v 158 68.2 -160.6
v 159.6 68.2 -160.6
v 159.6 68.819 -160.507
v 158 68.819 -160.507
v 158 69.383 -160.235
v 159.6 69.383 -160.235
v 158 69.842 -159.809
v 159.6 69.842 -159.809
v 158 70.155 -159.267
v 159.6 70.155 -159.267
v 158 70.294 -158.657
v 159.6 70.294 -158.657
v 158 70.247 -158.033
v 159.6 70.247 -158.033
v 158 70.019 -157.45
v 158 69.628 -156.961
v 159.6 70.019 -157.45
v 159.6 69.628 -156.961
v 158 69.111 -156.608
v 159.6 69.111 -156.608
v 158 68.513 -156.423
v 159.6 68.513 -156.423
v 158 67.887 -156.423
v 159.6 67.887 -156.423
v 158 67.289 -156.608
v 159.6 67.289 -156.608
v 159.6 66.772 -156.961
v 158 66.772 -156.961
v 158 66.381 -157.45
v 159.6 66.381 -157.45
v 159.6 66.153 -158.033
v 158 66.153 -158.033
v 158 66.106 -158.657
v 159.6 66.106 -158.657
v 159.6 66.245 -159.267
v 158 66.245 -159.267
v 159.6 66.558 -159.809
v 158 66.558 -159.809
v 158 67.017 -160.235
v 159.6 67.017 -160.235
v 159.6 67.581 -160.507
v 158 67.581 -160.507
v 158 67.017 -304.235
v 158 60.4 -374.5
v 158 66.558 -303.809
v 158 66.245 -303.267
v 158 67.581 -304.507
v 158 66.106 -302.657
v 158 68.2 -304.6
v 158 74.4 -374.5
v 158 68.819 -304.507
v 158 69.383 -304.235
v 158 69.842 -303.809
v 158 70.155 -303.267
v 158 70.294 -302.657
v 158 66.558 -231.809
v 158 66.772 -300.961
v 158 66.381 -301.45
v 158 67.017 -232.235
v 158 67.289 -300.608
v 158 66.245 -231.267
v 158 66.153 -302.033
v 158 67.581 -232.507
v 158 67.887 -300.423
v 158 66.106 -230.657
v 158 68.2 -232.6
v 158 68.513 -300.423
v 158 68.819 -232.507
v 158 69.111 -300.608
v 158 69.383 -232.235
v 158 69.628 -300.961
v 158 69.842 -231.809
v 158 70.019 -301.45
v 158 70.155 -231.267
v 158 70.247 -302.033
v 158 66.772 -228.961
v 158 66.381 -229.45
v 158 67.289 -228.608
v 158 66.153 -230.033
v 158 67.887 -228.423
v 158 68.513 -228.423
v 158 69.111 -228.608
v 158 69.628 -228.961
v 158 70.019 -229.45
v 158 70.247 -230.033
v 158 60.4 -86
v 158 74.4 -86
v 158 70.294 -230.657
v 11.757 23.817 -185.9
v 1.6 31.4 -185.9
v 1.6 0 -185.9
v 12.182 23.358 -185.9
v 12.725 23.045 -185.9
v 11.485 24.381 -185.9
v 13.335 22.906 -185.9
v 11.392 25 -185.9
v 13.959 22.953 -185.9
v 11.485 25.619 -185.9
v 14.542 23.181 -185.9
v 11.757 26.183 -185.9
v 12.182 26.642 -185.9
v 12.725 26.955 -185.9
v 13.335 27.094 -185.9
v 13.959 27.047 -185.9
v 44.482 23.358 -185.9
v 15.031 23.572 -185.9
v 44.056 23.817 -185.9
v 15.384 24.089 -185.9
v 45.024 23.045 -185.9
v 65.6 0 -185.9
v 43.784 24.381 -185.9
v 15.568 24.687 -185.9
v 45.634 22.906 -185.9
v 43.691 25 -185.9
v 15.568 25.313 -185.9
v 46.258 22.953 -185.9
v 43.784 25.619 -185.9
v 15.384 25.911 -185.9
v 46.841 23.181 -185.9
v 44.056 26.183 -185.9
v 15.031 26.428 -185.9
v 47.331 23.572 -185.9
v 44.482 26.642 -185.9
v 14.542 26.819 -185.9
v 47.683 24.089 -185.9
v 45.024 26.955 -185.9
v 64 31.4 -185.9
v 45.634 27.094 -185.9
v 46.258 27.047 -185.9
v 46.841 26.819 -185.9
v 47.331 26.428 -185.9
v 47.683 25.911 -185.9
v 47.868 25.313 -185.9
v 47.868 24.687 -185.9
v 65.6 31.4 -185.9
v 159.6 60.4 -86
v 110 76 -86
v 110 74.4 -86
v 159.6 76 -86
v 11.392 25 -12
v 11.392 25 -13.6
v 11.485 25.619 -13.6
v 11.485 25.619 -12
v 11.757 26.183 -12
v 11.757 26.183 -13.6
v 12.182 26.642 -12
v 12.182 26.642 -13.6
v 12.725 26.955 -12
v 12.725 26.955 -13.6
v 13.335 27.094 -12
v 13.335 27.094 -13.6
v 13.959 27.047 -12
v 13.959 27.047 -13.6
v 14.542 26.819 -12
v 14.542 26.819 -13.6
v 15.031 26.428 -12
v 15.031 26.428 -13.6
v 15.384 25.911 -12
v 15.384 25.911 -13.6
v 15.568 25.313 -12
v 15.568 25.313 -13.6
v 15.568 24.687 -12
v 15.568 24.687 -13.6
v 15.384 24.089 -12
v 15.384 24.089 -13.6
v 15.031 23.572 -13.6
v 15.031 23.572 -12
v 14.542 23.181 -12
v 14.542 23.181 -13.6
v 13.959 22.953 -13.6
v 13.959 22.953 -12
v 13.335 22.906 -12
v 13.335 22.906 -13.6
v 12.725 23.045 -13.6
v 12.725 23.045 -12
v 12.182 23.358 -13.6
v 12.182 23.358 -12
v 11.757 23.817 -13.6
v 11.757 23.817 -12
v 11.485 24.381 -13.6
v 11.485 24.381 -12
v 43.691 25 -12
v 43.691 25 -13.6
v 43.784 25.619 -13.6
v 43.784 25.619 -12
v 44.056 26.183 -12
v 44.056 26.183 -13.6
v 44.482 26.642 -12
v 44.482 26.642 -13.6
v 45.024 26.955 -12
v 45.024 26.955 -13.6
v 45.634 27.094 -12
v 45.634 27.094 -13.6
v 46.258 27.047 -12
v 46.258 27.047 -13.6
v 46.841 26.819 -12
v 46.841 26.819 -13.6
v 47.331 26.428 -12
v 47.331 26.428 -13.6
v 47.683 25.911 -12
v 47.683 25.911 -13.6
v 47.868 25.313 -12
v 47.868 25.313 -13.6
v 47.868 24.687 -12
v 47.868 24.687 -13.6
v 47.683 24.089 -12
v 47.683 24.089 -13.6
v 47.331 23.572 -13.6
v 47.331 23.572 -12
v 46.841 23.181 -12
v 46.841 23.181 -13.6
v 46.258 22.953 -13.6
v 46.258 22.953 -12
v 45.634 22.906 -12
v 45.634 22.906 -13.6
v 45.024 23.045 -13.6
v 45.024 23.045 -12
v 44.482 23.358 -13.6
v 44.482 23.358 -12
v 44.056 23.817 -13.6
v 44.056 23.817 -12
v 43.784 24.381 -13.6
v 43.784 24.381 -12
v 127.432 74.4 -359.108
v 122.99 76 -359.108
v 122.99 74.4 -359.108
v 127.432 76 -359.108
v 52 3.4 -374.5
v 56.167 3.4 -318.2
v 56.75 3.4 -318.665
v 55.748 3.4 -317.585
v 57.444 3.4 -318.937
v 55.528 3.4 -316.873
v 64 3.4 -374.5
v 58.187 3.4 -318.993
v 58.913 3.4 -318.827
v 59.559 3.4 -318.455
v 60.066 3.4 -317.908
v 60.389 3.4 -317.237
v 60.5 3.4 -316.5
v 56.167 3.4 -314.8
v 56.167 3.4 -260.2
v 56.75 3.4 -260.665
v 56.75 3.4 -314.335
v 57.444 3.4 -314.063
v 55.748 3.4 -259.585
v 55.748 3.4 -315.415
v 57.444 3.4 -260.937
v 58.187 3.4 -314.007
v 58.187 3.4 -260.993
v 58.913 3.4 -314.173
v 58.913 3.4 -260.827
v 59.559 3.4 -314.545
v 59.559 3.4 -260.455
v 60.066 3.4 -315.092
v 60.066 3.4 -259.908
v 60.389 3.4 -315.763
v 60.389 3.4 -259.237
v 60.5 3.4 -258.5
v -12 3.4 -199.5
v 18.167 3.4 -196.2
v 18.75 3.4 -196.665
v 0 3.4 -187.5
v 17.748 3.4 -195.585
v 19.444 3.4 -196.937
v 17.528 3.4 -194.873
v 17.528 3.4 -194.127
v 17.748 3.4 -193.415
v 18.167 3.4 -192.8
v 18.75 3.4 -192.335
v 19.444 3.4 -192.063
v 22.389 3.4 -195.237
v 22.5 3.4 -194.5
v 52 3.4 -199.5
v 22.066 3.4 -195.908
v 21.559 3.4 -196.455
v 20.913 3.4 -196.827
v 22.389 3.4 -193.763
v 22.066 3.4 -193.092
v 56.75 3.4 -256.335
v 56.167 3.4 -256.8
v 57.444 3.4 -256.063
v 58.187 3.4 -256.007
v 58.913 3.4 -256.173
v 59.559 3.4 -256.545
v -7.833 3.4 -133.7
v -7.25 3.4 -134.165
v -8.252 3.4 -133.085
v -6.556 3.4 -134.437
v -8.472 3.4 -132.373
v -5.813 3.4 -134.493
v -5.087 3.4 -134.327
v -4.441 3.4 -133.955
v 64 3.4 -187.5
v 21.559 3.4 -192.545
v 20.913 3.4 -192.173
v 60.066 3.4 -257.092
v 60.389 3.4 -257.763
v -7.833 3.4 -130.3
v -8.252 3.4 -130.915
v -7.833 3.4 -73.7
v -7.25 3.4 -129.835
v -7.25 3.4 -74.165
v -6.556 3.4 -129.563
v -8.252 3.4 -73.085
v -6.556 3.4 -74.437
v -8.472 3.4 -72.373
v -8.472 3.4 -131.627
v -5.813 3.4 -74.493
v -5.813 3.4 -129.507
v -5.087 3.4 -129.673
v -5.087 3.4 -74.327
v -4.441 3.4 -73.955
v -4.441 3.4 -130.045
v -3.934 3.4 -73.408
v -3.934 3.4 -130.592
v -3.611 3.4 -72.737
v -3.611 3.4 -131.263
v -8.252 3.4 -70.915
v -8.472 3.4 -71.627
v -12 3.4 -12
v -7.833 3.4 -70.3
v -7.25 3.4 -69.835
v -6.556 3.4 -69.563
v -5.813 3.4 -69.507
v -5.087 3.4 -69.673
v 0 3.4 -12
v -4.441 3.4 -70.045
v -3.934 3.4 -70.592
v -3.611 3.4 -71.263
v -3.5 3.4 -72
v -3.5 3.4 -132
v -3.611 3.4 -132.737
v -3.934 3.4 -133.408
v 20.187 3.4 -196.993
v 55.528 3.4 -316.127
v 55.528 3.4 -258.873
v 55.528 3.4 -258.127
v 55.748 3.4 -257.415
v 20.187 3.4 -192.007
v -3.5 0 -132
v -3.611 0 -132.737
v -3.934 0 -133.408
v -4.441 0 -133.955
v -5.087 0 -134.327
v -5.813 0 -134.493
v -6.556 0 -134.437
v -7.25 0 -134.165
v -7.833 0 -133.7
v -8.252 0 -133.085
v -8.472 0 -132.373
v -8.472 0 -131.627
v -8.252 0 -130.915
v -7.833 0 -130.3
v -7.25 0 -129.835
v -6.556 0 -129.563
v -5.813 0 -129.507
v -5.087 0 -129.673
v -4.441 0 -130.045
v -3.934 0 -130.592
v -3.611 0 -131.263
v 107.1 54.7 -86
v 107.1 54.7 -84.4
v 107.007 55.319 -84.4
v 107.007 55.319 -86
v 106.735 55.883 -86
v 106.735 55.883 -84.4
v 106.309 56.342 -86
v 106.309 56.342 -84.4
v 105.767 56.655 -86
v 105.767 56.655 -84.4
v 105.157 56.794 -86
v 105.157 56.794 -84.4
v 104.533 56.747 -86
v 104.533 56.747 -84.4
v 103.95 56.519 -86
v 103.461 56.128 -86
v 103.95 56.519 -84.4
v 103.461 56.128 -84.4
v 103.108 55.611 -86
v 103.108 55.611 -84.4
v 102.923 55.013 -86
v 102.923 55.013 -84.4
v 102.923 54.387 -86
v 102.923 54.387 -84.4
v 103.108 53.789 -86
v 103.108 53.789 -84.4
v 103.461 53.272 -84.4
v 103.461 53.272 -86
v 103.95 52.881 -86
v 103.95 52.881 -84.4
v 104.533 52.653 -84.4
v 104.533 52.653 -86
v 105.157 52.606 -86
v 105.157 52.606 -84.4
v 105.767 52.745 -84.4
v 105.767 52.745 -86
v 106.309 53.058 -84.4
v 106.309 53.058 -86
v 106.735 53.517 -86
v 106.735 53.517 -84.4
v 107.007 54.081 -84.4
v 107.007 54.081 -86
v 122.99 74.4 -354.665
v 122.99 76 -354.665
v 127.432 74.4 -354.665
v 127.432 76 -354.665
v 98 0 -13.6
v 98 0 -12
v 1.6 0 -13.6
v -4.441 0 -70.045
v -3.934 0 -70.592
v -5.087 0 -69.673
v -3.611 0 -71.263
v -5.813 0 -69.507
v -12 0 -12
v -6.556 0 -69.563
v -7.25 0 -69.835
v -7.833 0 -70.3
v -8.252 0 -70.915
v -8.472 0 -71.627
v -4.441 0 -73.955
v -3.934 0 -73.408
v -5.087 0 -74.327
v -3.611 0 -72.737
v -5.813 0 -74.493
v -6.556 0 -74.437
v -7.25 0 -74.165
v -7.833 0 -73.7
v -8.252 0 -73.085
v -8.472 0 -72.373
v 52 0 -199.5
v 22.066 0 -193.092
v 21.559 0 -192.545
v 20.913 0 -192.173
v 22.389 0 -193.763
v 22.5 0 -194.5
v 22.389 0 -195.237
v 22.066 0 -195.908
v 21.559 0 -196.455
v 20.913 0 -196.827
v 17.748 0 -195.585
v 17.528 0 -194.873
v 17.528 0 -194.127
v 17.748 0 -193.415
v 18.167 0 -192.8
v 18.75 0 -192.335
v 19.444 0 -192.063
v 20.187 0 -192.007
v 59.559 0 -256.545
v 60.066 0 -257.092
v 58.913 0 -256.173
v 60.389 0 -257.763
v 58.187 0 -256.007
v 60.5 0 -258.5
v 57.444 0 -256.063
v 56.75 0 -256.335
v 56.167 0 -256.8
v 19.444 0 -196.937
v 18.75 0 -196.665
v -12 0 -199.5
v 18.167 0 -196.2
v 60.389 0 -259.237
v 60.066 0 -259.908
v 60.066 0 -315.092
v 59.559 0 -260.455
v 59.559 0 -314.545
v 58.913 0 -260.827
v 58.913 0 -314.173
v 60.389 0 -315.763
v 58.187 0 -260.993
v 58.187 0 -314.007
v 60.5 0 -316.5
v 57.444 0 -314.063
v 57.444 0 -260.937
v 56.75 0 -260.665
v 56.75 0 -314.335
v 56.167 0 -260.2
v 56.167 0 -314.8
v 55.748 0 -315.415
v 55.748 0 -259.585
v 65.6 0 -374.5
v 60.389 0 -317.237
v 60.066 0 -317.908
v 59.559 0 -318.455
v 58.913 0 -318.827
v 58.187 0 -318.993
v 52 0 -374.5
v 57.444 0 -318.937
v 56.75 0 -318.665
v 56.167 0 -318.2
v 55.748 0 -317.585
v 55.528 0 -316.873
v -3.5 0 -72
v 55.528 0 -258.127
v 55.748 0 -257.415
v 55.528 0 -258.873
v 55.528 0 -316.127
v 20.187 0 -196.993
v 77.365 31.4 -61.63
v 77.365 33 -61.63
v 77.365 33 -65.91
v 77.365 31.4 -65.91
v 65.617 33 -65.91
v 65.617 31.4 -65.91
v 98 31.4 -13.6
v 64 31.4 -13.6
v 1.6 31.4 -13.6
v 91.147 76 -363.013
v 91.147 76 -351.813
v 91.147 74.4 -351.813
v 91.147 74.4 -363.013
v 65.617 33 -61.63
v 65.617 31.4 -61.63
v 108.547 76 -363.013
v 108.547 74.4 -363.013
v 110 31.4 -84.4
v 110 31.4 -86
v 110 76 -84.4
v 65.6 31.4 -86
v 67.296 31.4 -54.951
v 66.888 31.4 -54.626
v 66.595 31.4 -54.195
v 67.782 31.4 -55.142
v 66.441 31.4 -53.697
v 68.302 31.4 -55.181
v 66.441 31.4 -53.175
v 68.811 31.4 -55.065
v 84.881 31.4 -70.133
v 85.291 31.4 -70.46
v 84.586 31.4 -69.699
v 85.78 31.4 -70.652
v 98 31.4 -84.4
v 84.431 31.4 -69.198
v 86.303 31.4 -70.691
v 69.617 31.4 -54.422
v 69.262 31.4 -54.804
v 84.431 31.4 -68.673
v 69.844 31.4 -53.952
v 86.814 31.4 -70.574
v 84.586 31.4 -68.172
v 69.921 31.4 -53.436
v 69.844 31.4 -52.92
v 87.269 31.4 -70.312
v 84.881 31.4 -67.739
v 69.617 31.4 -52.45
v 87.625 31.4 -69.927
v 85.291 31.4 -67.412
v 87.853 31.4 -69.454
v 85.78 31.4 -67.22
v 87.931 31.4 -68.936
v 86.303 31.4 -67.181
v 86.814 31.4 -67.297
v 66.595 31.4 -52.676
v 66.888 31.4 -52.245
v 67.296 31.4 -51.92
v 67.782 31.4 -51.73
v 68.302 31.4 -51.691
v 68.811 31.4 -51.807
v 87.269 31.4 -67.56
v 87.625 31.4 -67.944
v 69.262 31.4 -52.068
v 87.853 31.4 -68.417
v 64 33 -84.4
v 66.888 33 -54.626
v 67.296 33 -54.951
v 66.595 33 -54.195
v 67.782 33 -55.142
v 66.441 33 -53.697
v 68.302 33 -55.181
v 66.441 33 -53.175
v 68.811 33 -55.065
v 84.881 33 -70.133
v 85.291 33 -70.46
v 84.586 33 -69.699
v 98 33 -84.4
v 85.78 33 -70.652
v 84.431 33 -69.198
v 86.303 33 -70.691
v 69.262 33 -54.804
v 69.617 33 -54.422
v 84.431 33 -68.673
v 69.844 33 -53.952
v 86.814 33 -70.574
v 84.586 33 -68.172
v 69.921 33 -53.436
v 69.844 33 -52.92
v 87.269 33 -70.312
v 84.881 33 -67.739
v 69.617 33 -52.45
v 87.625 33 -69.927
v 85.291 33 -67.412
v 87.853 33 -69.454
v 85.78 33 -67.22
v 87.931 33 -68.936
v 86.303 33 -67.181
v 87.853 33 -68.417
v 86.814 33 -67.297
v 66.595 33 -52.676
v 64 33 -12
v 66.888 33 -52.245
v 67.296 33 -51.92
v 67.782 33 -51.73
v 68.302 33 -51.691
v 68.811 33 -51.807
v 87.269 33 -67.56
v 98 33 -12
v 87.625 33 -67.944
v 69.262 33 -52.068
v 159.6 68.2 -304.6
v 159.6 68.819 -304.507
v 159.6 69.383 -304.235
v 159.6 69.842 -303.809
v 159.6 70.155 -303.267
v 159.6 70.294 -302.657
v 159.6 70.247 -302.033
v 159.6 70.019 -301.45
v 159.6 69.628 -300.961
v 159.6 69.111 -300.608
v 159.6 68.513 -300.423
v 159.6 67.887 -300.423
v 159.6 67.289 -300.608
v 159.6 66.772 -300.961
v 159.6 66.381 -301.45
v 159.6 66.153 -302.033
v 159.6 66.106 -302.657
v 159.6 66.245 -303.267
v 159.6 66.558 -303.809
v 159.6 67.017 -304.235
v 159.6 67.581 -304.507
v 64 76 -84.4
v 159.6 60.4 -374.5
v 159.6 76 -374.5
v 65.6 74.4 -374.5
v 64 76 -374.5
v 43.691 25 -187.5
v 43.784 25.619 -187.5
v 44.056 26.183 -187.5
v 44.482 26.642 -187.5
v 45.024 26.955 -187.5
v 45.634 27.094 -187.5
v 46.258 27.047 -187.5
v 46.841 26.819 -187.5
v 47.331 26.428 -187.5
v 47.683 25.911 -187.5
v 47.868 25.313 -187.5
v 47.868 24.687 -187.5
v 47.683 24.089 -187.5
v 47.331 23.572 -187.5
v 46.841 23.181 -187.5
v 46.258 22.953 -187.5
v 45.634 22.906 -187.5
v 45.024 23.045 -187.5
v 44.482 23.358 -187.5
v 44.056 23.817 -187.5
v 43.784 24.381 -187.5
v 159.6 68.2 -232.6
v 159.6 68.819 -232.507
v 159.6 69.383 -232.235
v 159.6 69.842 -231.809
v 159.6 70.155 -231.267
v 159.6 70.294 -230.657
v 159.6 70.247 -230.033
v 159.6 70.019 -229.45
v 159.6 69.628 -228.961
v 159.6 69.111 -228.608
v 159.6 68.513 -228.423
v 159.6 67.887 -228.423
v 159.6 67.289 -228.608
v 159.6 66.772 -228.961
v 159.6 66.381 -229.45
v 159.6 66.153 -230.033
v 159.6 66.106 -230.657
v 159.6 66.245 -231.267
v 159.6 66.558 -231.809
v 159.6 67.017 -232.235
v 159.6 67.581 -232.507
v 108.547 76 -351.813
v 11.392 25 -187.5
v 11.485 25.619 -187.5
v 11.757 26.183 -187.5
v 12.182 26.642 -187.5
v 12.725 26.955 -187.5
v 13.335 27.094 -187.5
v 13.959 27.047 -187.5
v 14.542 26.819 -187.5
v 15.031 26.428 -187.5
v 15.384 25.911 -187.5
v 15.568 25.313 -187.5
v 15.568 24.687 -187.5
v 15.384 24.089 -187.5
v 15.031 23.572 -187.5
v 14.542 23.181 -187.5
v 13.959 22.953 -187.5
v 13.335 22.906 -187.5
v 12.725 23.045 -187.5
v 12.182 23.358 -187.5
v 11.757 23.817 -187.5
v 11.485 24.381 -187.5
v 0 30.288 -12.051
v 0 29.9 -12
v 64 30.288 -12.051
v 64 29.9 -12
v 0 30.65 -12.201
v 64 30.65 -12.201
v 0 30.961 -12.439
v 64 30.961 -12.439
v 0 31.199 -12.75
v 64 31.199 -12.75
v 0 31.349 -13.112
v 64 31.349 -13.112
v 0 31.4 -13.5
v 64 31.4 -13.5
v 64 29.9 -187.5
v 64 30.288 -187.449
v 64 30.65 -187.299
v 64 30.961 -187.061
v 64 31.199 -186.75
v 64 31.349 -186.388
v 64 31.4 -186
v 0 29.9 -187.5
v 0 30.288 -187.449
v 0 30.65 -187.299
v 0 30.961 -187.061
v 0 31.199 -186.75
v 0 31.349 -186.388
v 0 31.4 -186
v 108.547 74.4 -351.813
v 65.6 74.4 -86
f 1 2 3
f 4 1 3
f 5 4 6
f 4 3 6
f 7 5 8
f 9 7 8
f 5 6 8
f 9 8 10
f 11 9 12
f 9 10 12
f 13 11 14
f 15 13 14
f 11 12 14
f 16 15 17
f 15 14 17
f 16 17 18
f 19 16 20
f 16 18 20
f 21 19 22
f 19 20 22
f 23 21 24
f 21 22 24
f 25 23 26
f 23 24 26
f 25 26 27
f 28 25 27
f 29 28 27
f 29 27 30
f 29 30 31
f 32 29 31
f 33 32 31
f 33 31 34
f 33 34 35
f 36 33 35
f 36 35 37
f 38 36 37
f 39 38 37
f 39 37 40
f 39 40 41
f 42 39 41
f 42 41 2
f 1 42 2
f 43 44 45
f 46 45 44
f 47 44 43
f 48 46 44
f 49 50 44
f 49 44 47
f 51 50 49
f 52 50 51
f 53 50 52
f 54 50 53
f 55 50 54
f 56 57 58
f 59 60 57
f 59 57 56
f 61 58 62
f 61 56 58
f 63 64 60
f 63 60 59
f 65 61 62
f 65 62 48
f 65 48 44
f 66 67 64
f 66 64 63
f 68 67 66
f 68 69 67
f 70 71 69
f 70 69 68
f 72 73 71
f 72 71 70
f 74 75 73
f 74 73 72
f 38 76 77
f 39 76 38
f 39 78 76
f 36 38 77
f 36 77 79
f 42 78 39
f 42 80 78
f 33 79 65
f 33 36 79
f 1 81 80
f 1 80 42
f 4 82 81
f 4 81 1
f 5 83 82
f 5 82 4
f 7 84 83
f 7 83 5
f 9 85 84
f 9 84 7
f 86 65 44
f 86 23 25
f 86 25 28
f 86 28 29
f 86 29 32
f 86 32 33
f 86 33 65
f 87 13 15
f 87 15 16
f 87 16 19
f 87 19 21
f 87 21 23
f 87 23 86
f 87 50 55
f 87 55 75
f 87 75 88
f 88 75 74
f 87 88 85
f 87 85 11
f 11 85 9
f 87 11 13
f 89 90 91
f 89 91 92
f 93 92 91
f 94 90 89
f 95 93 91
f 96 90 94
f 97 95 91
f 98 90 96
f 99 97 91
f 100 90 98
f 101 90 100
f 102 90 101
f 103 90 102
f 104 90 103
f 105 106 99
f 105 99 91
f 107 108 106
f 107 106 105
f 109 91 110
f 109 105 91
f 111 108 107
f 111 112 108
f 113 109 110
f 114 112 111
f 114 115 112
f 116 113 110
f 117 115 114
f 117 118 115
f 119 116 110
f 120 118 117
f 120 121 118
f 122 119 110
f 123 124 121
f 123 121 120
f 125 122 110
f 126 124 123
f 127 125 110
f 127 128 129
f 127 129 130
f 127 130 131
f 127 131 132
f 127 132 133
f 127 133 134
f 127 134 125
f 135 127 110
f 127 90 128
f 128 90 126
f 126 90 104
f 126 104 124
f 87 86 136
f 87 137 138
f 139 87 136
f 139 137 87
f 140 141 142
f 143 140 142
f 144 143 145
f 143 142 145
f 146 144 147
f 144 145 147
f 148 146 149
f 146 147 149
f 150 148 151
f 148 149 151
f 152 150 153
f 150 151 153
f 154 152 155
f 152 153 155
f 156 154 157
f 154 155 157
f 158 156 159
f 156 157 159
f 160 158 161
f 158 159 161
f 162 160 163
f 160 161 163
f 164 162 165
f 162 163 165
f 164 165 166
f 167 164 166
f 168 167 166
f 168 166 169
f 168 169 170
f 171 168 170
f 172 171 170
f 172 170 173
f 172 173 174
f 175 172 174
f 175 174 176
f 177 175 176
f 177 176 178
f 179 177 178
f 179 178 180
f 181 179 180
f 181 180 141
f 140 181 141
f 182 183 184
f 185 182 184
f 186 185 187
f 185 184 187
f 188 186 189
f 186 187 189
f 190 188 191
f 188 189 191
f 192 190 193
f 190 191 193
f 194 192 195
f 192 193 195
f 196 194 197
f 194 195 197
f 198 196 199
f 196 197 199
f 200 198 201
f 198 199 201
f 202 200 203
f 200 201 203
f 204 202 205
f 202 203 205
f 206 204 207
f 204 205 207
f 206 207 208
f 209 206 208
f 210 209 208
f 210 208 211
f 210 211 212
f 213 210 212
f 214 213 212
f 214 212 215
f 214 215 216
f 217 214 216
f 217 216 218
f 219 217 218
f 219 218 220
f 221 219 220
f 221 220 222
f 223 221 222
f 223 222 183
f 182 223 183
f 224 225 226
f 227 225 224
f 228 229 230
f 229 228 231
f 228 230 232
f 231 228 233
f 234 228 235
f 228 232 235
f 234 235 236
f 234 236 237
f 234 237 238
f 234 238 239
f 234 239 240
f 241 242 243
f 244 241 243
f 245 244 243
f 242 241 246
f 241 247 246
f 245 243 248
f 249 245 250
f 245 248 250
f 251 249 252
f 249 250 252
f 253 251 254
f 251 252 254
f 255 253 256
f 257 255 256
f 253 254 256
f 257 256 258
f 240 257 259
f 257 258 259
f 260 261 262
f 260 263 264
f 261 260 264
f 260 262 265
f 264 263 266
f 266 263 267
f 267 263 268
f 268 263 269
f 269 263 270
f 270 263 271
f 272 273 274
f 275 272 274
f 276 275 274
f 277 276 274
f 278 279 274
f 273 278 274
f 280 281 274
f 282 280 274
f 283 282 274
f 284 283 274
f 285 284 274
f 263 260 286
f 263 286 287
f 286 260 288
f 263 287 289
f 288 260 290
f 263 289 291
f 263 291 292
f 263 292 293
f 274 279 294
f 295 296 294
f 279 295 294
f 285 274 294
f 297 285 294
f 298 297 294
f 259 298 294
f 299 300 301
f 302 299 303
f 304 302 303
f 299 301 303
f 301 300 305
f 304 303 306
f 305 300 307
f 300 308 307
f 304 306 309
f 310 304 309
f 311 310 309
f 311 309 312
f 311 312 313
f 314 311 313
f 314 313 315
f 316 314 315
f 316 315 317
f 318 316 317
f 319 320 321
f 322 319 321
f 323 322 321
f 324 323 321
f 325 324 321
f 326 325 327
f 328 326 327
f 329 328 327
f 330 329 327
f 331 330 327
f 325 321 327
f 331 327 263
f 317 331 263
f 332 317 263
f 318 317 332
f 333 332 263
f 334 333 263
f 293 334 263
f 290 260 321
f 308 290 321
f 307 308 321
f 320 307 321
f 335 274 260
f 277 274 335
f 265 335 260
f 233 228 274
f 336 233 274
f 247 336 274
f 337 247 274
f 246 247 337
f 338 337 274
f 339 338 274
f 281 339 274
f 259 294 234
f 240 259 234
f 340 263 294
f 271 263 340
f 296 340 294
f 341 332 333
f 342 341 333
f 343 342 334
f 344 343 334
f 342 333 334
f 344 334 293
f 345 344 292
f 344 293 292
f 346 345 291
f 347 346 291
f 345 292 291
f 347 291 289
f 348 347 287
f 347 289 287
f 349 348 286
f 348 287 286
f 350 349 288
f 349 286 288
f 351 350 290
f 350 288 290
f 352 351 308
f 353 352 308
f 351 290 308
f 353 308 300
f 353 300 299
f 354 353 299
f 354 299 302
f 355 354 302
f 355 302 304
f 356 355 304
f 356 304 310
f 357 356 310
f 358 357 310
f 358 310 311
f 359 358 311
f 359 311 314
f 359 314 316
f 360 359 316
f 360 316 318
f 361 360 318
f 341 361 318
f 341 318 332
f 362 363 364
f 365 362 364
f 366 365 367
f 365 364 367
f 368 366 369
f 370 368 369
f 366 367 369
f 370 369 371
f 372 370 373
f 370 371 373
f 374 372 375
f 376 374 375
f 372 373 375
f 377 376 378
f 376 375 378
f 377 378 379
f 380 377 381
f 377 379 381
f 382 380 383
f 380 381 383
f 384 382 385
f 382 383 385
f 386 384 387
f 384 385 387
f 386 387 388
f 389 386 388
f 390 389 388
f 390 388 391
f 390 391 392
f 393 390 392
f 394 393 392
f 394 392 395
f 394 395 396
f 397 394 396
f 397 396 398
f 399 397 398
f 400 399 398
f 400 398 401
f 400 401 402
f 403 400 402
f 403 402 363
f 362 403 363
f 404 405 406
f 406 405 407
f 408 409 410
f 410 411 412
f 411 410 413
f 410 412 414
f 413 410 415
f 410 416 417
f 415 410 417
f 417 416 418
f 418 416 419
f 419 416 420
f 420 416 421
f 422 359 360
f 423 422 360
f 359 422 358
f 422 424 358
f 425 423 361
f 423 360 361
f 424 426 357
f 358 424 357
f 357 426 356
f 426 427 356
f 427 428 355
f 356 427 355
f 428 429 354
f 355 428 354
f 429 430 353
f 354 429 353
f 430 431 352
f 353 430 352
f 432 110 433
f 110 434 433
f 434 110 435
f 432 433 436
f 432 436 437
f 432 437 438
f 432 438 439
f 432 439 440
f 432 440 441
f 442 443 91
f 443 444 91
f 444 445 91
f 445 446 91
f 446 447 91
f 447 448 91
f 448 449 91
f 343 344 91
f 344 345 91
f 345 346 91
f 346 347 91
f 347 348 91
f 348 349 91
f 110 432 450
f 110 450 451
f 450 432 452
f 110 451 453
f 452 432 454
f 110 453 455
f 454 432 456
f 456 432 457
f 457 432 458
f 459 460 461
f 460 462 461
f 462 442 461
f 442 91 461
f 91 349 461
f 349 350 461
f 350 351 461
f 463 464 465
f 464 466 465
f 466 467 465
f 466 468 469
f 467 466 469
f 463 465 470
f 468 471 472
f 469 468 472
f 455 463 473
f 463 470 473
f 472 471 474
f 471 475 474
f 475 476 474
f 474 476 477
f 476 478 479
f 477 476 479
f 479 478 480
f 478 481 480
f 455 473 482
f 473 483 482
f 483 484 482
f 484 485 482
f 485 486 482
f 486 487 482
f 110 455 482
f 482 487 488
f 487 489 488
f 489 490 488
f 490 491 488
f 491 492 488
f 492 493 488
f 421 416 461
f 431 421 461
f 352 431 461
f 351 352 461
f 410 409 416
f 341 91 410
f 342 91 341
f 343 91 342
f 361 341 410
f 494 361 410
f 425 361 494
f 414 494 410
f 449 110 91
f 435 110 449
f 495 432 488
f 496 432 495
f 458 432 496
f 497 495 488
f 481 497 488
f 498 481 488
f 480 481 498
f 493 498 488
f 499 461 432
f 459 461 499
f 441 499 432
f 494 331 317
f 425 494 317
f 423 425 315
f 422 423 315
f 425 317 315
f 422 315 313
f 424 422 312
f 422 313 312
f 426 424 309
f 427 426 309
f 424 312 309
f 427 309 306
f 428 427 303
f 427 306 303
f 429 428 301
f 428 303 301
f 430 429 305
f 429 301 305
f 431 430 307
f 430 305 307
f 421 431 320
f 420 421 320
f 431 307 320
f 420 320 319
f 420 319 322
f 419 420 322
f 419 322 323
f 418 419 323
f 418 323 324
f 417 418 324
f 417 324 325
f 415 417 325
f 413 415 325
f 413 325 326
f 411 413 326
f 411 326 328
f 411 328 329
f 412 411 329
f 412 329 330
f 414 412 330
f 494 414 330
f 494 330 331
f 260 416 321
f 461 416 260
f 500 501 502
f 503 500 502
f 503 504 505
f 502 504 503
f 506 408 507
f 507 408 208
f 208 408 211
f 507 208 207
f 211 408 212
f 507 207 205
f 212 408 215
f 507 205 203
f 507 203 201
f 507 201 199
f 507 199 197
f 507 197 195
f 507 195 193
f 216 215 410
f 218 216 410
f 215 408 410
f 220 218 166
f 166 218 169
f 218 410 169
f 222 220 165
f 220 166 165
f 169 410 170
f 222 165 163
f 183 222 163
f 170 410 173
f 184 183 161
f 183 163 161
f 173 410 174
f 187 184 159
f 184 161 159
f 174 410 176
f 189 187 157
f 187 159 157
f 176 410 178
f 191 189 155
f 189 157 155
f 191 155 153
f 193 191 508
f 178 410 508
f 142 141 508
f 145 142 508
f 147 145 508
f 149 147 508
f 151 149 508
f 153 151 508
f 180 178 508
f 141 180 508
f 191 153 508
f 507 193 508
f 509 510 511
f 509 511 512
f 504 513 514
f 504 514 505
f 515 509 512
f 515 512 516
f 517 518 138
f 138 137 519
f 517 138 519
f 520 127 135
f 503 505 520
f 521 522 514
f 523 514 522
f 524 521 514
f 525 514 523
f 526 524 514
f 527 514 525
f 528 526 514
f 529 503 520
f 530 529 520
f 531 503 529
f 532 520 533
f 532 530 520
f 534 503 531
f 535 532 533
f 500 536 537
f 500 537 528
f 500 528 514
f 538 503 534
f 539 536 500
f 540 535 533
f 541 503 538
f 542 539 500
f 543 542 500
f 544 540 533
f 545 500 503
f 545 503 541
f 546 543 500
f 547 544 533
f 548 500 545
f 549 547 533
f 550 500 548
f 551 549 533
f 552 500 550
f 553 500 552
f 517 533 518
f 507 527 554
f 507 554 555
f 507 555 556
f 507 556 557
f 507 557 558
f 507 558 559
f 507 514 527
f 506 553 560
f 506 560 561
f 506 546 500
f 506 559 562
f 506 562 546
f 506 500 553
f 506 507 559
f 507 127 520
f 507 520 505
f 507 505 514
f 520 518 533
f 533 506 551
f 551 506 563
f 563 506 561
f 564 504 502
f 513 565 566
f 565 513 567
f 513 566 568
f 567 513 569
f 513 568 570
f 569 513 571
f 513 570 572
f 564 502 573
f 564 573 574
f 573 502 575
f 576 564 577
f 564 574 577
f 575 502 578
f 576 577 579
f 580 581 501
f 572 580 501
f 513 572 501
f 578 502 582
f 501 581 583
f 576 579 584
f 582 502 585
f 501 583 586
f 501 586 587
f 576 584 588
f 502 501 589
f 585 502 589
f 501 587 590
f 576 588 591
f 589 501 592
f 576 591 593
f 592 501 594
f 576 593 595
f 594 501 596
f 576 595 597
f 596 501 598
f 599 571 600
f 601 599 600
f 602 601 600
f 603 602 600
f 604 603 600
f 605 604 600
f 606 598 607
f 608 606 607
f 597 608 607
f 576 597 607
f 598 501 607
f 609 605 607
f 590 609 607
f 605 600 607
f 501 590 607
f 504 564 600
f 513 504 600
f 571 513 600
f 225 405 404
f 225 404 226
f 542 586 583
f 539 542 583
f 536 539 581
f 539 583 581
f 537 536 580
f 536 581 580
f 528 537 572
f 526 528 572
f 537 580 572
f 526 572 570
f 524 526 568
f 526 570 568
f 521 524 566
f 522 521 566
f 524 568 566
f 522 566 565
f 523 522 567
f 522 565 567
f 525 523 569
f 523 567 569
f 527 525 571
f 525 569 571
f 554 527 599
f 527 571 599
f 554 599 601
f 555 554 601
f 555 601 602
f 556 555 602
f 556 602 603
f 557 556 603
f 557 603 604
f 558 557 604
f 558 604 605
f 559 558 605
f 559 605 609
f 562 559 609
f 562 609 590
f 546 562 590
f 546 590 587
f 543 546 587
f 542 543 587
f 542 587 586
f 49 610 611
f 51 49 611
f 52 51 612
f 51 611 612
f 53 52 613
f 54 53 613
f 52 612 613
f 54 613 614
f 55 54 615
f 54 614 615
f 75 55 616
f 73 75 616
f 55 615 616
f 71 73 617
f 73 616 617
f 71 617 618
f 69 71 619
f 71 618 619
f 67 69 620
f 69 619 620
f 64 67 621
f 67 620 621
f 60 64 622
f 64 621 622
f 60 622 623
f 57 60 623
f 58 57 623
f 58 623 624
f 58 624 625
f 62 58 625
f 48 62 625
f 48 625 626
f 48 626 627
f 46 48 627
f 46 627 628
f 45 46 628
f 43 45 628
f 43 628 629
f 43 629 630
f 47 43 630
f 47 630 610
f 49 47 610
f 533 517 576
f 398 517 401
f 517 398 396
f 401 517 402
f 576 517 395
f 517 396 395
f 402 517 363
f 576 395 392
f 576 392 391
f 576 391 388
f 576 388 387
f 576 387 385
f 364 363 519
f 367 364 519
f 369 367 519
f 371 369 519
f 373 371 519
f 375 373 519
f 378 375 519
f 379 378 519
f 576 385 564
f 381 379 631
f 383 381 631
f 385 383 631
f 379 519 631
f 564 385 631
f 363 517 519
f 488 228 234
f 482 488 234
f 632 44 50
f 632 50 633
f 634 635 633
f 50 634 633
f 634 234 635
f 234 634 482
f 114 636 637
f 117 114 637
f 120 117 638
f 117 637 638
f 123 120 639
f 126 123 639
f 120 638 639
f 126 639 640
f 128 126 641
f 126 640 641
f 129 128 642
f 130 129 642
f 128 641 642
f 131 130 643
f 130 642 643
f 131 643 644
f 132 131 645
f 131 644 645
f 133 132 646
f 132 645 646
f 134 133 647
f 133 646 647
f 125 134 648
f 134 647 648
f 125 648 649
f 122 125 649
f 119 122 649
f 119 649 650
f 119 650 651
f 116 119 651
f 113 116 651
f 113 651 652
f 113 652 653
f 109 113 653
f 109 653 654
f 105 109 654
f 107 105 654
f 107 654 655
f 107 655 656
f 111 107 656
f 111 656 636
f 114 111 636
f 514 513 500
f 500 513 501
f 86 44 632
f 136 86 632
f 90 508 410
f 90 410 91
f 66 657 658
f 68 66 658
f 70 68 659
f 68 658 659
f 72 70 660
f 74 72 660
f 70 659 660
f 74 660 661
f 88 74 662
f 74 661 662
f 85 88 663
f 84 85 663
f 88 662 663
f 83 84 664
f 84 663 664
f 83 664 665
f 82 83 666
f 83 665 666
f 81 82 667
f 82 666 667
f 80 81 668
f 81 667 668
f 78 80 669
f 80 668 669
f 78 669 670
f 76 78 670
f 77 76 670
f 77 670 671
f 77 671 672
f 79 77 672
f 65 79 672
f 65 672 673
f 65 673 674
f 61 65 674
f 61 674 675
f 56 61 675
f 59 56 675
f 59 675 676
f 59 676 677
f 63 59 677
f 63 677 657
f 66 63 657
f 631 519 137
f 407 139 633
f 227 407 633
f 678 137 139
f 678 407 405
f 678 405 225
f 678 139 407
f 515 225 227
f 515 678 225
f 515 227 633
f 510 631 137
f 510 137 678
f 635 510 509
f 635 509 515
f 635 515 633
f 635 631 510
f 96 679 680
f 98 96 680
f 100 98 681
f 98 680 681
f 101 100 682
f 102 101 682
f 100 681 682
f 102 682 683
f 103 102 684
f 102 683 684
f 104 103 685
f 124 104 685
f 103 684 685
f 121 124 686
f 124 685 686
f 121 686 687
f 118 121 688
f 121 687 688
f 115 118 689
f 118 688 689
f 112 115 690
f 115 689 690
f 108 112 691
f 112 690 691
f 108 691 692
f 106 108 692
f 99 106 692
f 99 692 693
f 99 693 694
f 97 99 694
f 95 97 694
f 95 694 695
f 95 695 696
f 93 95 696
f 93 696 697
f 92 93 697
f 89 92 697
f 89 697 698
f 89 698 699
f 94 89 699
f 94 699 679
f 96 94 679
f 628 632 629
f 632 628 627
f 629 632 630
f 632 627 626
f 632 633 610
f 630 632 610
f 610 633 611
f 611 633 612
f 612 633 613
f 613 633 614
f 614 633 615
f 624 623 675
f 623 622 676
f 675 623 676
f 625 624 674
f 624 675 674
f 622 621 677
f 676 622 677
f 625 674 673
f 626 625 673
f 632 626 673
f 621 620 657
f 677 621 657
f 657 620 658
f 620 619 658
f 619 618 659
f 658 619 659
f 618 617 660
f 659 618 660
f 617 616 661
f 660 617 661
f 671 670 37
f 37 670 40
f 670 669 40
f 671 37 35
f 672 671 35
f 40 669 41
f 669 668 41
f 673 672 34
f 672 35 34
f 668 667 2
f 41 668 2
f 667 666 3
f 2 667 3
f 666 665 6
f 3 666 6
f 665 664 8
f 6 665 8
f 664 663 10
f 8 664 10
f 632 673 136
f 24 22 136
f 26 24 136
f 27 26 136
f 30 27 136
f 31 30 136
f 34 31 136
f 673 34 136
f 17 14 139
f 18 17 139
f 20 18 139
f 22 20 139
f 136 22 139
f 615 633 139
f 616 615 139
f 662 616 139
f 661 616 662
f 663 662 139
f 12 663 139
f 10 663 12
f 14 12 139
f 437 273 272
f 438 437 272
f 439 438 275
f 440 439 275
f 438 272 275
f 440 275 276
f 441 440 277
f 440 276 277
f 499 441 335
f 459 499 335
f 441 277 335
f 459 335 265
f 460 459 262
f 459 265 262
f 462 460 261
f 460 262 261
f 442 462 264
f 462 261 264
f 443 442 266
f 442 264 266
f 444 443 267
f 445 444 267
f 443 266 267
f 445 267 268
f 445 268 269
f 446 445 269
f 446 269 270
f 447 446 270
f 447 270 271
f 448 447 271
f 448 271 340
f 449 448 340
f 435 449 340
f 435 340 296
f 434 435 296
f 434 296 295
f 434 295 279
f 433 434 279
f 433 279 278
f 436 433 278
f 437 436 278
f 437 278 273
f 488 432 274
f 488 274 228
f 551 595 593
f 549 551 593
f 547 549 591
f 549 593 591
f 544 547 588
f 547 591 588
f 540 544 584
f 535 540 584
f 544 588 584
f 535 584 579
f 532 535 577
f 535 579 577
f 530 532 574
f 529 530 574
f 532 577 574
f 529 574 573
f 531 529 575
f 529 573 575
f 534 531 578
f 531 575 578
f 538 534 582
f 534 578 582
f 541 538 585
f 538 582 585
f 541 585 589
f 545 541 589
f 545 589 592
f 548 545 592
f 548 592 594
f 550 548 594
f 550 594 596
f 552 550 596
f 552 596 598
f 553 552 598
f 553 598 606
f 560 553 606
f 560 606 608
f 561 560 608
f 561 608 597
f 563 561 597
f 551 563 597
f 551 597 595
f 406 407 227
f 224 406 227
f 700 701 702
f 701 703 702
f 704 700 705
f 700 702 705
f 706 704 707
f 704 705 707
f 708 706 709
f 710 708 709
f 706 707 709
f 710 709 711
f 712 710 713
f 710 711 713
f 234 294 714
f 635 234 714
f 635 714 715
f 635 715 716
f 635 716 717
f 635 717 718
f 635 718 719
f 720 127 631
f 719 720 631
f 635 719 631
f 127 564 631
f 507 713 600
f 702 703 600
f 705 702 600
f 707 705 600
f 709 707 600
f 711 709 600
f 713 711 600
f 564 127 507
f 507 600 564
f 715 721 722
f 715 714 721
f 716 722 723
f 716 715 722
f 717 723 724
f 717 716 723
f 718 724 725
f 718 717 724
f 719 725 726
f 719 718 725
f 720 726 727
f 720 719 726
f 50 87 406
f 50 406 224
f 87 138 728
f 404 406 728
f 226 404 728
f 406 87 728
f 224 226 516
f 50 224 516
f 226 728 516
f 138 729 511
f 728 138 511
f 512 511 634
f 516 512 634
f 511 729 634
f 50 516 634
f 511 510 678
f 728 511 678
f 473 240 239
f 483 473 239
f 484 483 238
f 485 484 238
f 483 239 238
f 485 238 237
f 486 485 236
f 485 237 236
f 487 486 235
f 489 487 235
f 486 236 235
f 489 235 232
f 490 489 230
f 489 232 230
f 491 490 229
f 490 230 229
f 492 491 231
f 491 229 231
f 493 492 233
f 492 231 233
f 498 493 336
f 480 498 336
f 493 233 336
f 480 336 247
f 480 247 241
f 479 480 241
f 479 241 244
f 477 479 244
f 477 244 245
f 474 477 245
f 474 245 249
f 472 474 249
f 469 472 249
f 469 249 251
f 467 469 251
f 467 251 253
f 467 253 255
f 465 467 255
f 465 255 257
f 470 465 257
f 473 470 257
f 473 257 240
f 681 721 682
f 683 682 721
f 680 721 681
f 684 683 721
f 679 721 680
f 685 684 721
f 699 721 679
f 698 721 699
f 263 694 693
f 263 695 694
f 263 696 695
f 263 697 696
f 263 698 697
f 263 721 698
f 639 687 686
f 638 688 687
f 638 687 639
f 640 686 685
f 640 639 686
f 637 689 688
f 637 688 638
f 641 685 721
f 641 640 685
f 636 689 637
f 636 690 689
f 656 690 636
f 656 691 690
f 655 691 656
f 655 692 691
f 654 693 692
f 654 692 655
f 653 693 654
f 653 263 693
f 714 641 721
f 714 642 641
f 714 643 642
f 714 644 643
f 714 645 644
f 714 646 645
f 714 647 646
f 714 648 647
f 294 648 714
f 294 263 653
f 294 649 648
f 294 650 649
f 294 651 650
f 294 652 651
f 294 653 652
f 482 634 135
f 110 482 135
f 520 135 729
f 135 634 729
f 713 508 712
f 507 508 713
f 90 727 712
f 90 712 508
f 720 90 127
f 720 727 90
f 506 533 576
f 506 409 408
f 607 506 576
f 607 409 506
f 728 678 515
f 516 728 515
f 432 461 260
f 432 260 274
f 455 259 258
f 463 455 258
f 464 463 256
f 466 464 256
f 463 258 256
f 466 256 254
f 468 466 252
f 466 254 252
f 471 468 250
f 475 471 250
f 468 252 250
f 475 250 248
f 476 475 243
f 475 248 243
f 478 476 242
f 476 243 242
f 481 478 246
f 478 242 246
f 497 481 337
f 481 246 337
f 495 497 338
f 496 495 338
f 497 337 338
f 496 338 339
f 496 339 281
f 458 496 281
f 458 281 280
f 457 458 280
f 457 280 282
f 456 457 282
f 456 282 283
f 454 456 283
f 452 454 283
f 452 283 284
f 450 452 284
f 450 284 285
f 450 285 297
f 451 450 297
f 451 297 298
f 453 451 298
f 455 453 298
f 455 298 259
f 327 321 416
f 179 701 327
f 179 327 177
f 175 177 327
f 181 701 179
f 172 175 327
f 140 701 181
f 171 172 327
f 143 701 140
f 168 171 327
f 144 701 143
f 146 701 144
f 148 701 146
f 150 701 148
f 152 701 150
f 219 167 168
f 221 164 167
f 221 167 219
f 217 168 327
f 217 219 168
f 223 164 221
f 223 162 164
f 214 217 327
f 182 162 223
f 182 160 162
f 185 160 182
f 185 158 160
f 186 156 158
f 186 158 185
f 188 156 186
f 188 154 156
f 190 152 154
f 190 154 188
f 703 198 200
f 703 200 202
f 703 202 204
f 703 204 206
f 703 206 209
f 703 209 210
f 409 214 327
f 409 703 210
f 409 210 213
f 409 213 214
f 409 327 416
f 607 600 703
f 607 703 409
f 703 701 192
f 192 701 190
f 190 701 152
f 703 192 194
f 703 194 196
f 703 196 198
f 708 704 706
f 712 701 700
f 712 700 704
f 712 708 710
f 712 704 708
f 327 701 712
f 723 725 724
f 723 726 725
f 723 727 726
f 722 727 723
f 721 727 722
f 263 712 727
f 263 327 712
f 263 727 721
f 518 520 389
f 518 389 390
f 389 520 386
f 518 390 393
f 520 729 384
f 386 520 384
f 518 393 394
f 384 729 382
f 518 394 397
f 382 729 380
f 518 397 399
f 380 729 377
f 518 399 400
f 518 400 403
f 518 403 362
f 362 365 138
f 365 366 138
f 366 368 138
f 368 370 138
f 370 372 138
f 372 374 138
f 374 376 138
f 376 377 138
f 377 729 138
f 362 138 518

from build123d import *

# Parameters (mm, degrees)
BOSS_EXTRUDE1_DEPTH  = 76
SKETCH2_W            = 187.5
SKETCH2_H            = 42.6
CUT_EXTRUDE1_DEPTH   = 64
BOSS_EXTRUDE2_DEPTH  = 3.4
CUT_EXTRUDE2_DEPTH   = 12
SKETCH5_W            = 1.6
SKETCH5_H            = 42.6
BOSS_EXTRUDE3_DEPTH  = 141.4
SKETCH6_W            = 1.6
SKETCH6_H            = 33.4
BOSS_EXTRUDE4_DEPTH  = 158
SKETCH7_W            = 74
SKETCH7_H            = 1.6
BOSS_EXTRUDE5_DEPTH  = 94
SKETCH8_W            = 1.6
SKETCH8_H            = 41
CUT_EXTRUDE3_DEPTH   = 74
SKETCH10_W           = 95.6
SKETCH10_H           = 41
BOSS_EXTRUDE8_DEPTH  = 1.6
SKETCH11_W           = 62.4
SKETCH11_H           = 32.5
CUT_EXTRUDE4_DEPTH   = 33.4
SKETCH12_W           = 1.6
SKETCH12_H           = 32.5
CUT_EXTRUDE5_DEPTH   = 33.4
SKETCH13_W           = 61.6
SKETCH13_H           = 76
CUT_EXTRUDE6_DEPTH   = 74
SKETCH16_W           = 1.6
SKETCH16_H           = 42.6
BOSS_EXTRUDE11_DEPTH = 12
SKETCH17_W           = 288.5
SKETCH17_H           = 1.6
BOSS_EXTRUDE12_DEPTH = 94
SKETCH18_W           = 1.6
SKETCH18_H           = 288.5
BOSS_EXTRUDE13_DEPTH = 14
SKETCH19_R           = 1.75
SKETCH19_R_2         = 1.76
CUT_EXTRUDE7_DEPTH   = 5
SKETCH20_R           = 2.1
CUT_EXTRUDE9_DEPTH   = 195
SKETCH21_R           = 2.5
CUT_EXTRUDE10_DEPTH  = 10
SKETCH22_R           = 2.1
CUT_EXTRUDE11_DEPTH  = 4
SKETCH23_R           = 2.1
CUT_EXTRUDE12_DEPTH  = 4
SKETCH25_W           = 17.4
SKETCH25_H           = 11.2
SKETCH25_W_2         = 4.442640687
SKETCH25_H_2         = 4.442640687
CUT_EXTRUDE13_DEPTH  = 4
SKETCH27_W           = 64
SKETCH27_H           = 175.5
CUT_EXTRUDE15_DEPTH  = 2
CUT_EXTRUDE16_DEPTH  = 52
BOSS_EXTRUDE14_DEPTH = 2
SKETCH33_W           = 34
SKETCH33_H           = 1.6
BOSS_EXTRUDE16_DEPTH = 72.4
FILLET1_R            = 1.5
SKETCH34_R           = 1.76
SKETCH34_R_2         = 1.75
CUT_EXTRUDE17_DEPTH  = 10
SKETCH35_W           = 11.747931796
SKETCH35_H           = 4.280254221
CUT_EXTRUDE18_DEPTH  = 10


with BuildPart() as part:
    # Sketch1 → Boss-Extrude1 (new body)
    with BuildSketch(Plane(origin=(0, 0, 0), x_dir=(1, 0, 0), z_dir=(0, 1, 0))):
        Polygon((0, 0), (0, 187.5), (64, 187.5), (64, 374.5), (65.6, 374.5), (65.6, 153.4), (1.6, 153.4), (1.6, 0), align=None)
    extrude(amount=BOSS_EXTRUDE1_DEPTH)

    # Sketch2 → Cut-Extrude1 (cut)
    with BuildSketch(Plane.ZY):
        with Locations((-93.75, 54.7)):
            Rectangle(SKETCH2_W, SKETCH2_H)
    extrude(amount=-CUT_EXTRUDE1_DEPTH, mode=Mode.SUBTRACT)

    # Sketch3 → Boss-Extrude2 (add)
    with BuildSketch(Plane.XZ):
        Polygon((0, 0), (-12, 0), (-12, -199.5), (52, -199.5), (52, -374.5), (64, -374.5), (64, -187.5), (0, -187.5), align=None)
    extrude(amount=-BOSS_EXTRUDE2_DEPTH)

    # Sketch4 → Cut-Extrude2 (cut)
    with BuildSketch(Plane.XY):
        Polygon((-12, 0), (-12, 3.4), (0, 3.4), (0, 33.4), (1.6, 33.4), (1.6, 0), align=None)
    extrude(amount=-CUT_EXTRUDE2_DEPTH, mode=Mode.SUBTRACT)

    # Sketch5 → Boss-Extrude3 (add)
    with BuildSketch(Plane.XY.offset(-153.4)):
        with Locations((64.8, 54.7)):
            Rectangle(SKETCH5_W, SKETCH5_H)
    extrude(amount=BOSS_EXTRUDE3_DEPTH)

    # Sketch6 → Boss-Extrude4 (add)
    with BuildSketch(Plane(origin=(1.6, 0, 0), x_dir=(0, 0, -1), z_dir=(1, 0, 0))):
        with Locations((12.8, 16.7)):
            Rectangle(SKETCH6_W, SKETCH6_H)
    extrude(amount=BOSS_EXTRUDE4_DEPTH)

    # Sketch7 → Boss-Extrude5 (add)
    with BuildSketch(Plane(origin=(65.6, 0, 0), x_dir=(0, 0, -1), z_dir=(1, 0, 0))):
        with Locations((49, 34.2)):
            Rectangle(SKETCH7_W, SKETCH7_H)
    extrude(amount=BOSS_EXTRUDE5_DEPTH)

    # Sketch8 → Cut-Extrude3 (cut)
    with BuildSketch(Plane.XY.offset(-12)):
        with Locations((64.8, 55.5)):
            Rectangle(SKETCH8_W, SKETCH8_H)
    extrude(amount=-CUT_EXTRUDE3_DEPTH, mode=Mode.SUBTRACT)

    # Sketch10 → Boss-Extrude8 (add)
    with BuildSketch(Plane.XY.offset(-86)):
        with Locations((111.8, 55.5)):
            Rectangle(SKETCH10_W, SKETCH10_H)
    extrude(amount=BOSS_EXTRUDE8_DEPTH)

    # Sketch11 → Cut-Extrude4 (cut)
    with BuildSketch(Plane(origin=(0, 33.4, 0), x_dir=(1, 0, 0), z_dir=(0, 1, 0))):
        with Locations((32.8, 169.65)):
            Rectangle(SKETCH11_W, SKETCH11_H)
    extrude(amount=-CUT_EXTRUDE4_DEPTH, mode=Mode.SUBTRACT)

    # Sketch12 → Cut-Extrude5 (cut)
    with BuildSketch(Plane.XZ):
        with Locations((64.8, -169.65)):
            Rectangle(SKETCH12_W, SKETCH12_H)
    extrude(amount=-CUT_EXTRUDE5_DEPTH, mode=Mode.SUBTRACT)

    # Sketch13 → Cut-Extrude6 (cut)
    with BuildSketch(Plane.XY.offset(-12)):
        with Locations((128.8, 38)):
            Rectangle(SKETCH13_W, SKETCH13_H)
    extrude(amount=-CUT_EXTRUDE6_DEPTH, mode=Mode.SUBTRACT)

    # Sketch16 → Boss-Extrude11 (add)
    with BuildSketch(Plane(origin=(98, 0, 0), x_dir=(0, 0, -1), z_dir=(1, 0, 0))):
        with Locations((85.2, 54.7)):
            Rectangle(SKETCH16_W, SKETCH16_H)
    extrude(amount=BOSS_EXTRUDE11_DEPTH)

    # Sketch17 → Boss-Extrude12 (add)
    with BuildSketch(Plane(origin=(65.6, 0, 0), x_dir=(0, 0, -1), z_dir=(1, 0, 0))):
        with Locations((230.25, 75.2)):
            Rectangle(SKETCH17_W, SKETCH17_H)
    extrude(amount=BOSS_EXTRUDE12_DEPTH)

    # Sketch18 → Boss-Extrude13 (add)
    with BuildSketch(Plane.XZ.offset(-74.4)):
        with Locations((158.8, -230.25)):
            Rectangle(SKETCH18_W, SKETCH18_H)
    extrude(amount=BOSS_EXTRUDE13_DEPTH)

    # Sketch19 → Cut-Extrude7 (cut)
    with BuildSketch(Plane(origin=(0, 35, 0), x_dir=(1, 0, 0), z_dir=(0, 1, 0))):
        with Locations((68.171265028, 53.435726648)):
            Circle(SKETCH19_R)
        with Locations((86.171265028, 68.935726648)):
            Circle(SKETCH19_R_2)
    extrude(amount=-CUT_EXTRUDE7_DEPTH, mode=Mode.SUBTRACT)

    # Sketch20 → Cut-Extrude9 (cut)
    with BuildSketch(Plane(origin=(0, 0, -187.5), x_dir=(-1, 0, 0), z_dir=(0, 0, -1))):
        with Locations((-45.791182174, 25)):
            Circle(SKETCH20_R)
        with Locations((-13.491811911, 25)):
            Circle(SKETCH20_R)
    extrude(amount=-CUT_EXTRUDE9_DEPTH, mode=Mode.SUBTRACT)

    # Sketch21 → Cut-Extrude10 (cut)
    with BuildSketch(Plane(origin=(0, 3.4, 0), x_dir=(1, 0, 0), z_dir=(0, 1, 0))):
        with Locations((58, 316.5)):
            Circle(SKETCH21_R)
        with Locations((58, 258.5)):
            Circle(SKETCH21_R)
        with Locations((-6, 72)):
            Circle(SKETCH21_R)
        with Locations((-6, 132)):
            Circle(SKETCH21_R)
        with Locations((20, 194.5)):
            Circle(SKETCH21_R)
    extrude(amount=-CUT_EXTRUDE10_DEPTH, mode=Mode.SUBTRACT)

    # Sketch22 → Cut-Extrude11 (cut)
    with BuildSketch(Plane(origin=(159.6, 0, 0), x_dir=(0, 0, -1), z_dir=(1, 0, 0))):
        with Locations((302.5, 68.2)):
            Circle(SKETCH22_R)
        with Locations((230.5, 68.2)):
            Circle(SKETCH22_R)
        with Locations((158.5, 68.2)):
            Circle(SKETCH22_R)
    extrude(amount=-CUT_EXTRUDE11_DEPTH, mode=Mode.SUBTRACT)

    # Sketch23 → Cut-Extrude12 (cut)
    with BuildSketch(Plane.XY.offset(-84.4)):
        with Locations((105, 54.7)):
            Circle(SKETCH23_R)
    extrude(amount=-CUT_EXTRUDE12_DEPTH, mode=Mode.SUBTRACT)

    # Sketch25 → Cut-Extrude13 (cut)
    with BuildSketch(Plane(origin=(0, 76, 0), x_dir=(1, 0, 0), z_dir=(0, 1, 0))):
        with Locations((99.847103991, 357.413251396)):
            Rectangle(SKETCH25_W, SKETCH25_H)
        with Locations((125.211009125, 356.886739943)):
            Rectangle(SKETCH25_W_2, SKETCH25_H_2)
    extrude(amount=-CUT_EXTRUDE13_DEPTH, mode=Mode.SUBTRACT)

    # Sketch27 → Cut-Extrude15 (cut)
    with BuildSketch(Plane(origin=(0, 33.4, 0), x_dir=(1, 0, 0), z_dir=(0, 1, 0))):
        with Locations((32, 99.75)):
            Rectangle(SKETCH27_W, SKETCH27_H)
    extrude(amount=-CUT_EXTRUDE15_DEPTH, mode=Mode.SUBTRACT)

    # Sketch28 → Cut-Extrude16 (cut)
    with BuildSketch(Plane.ZY.offset(-64)):
        Polygon((-84.4, 35), (-84.4, 33.4), (-13.6, 33.4), (-13.6, 31.4), (-12, 31.4), (-12, 35), align=None)
    extrude(amount=-CUT_EXTRUDE16_DEPTH, mode=Mode.SUBTRACT)

    # Sketch29 → Boss-Extrude14 (add)
    with BuildSketch(Plane.XZ.offset(-33.4)):
        Polygon((110, -86), (110, -84.4), (64, -84.4), (64, -185.9), (65.6, -185.9), (65.6, -86), align=None)
    extrude(amount=BOSS_EXTRUDE14_DEPTH)

    # Sketch33 → Boss-Extrude16 (add)
    with BuildSketch(Plane.XY.offset(-12)):
        with Locations((81, 32.2)):
            Rectangle(SKETCH33_W, SKETCH33_H)
    extrude(amount=-BOSS_EXTRUDE16_DEPTH)

    # Fillet1
    fillet1_edges = [part.edges().sort_by_distance(p)[0] for p in [
        (32, 31.4, -187.5),
        (32, 31.4, -12),
    ]]
    fillet(fillet1_edges, radius=FILLET1_R)

    # Sketch34 → Cut-Extrude17 (cut)
    with BuildSketch(Plane(origin=(0, 33, 0), x_dir=(1, 0, 0), z_dir=(0, 1, 0))):
        with Locations((86.171265028, 68.935726648)):
            Circle(SKETCH34_R)
        with Locations((68.171265028, 53.435726648)):
            Circle(SKETCH34_R_2)
    extrude(amount=-CUT_EXTRUDE17_DEPTH, mode=Mode.SUBTRACT)

    # Sketch35 → Cut-Extrude18 (cut)
    with BuildSketch(Plane(origin=(0, 33, 0), x_dir=(1, 0, 0), z_dir=(0, 1, 0))):
        with Locations((71.491311388, 63.76994517)):
            Rectangle(SKETCH35_W, SKETCH35_H)
    extrude(amount=-CUT_EXTRUDE18_DEPTH, mode=Mode.SUBTRACT)


solid = part.part
